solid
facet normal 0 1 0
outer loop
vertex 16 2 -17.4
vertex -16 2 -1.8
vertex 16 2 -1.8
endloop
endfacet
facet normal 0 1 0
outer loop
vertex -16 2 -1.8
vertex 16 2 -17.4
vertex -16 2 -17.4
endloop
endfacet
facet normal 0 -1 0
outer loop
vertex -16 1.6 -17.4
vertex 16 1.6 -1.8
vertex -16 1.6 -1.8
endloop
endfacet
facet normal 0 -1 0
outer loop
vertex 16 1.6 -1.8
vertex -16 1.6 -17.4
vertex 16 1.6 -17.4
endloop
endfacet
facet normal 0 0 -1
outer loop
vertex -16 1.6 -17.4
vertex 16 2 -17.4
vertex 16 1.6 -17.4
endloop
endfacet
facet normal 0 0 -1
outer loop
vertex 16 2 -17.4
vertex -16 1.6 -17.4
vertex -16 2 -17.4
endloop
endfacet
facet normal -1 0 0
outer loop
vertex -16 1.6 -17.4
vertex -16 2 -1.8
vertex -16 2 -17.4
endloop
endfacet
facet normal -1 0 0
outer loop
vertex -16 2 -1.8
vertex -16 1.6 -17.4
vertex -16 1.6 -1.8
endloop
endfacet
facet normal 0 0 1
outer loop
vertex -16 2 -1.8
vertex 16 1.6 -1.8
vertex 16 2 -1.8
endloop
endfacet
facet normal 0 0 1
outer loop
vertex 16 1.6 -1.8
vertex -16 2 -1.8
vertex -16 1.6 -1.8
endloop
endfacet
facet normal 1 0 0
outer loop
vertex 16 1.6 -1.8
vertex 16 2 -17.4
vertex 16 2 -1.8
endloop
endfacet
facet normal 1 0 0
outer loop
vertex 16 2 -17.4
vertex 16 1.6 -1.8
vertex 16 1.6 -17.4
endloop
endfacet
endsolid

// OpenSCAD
// file: ../p/box.scad
use <../lib.scad>
function ldraw_lib__box() = [
// 0 Box 6 (six faces)
// 0 Name: box.dat
// 0 Author: James Jessiman
// 0 !LDRAW_ORG Primitive UPDATE 2002-05
// 0 !LICENSE Licensed under CC BY 4.0 : see CAreadme.txt
// 
// 0 BFC CERTIFY CCW
  [0,"BFC","CERTIFY"],
  [0,"BFC","CCW"],
// 
// 0 !HISTORY 2002-08-22 [sbliss] Applied BFC
// 0 !HISTORY 2002-11-30 [PTadmin] Official Update 2002-05
// 0 !HISTORY 2007-06-24 [PTadmin] Header formatted for Contributor Agreement
// 0 !HISTORY 2008-07-01 [PTadmin] Official Update 2008-01
// 
// 
// 2 24 1 1 1 -1 1 1
  [2,24,1,1,1,-1,1,1],
// 2 24 -1 1 1 -1 1 -1
  [2,24,-1,1,1,-1,1,-1],
// 2 24 -1 1 -1 1 1 -1
  [2,24,-1,1,-1,1,1,-1],
// 2 24 1 1 -1 1 1 1
  [2,24,1,1,-1,1,1,1],
// 2 24 1 -1 1 -1 -1 1
  [2,24,1,-1,1,-1,-1,1],
// 2 24 -1 -1 1 -1 -1 -1
  [2,24,-1,-1,1,-1,-1,-1],
// 2 24 -1 -1 -1 1 -1 -1
  [2,24,-1,-1,-1,1,-1,-1],
// 2 24 1 -1 -1 1 -1 1
  [2,24,1,-1,-1,1,-1,1],
// 2 24 1 -1 1 1 1 1
  [2,24,1,-1,1,1,1,1],
// 2 24 -1 -1 1 -1 1 1
  [2,24,-1,-1,1,-1,1,1],
// 2 24 1 -1 -1 1 1 -1
  [2,24,1,-1,-1,1,1,-1],
// 2 24 -1 -1 -1 -1 1 -1
  [2,24,-1,-1,-1,-1,1,-1],
// 4 16 1 1 1 1 1 -1 -1 1 -1 -1 1 1
  [4,16,1,1,1,1,1,-1,-1,1,-1,-1,1,1],
// 4 16 -1 -1 -1 1 -1 -1 1 -1 1 -1 -1 1
  [4,16,-1,-1,-1,1,-1,-1,1,-1,1,-1,-1,1],
// 4 16 -1 -1 1 1 -1 1 1 1 1 -1 1 1
  [4,16,-1,-1,1,1,-1,1,1,1,1,-1,1,1],
// 4 16 -1 -1 -1 -1 -1 1 -1 1 1 -1 1 -1
  [4,16,-1,-1,-1,-1,-1,1,-1,1,1,-1,1,-1],
// 4 16 1 -1 -1 -1 -1 -1 -1 1 -1 1 1 -1
  [4,16,1,-1,-1,-1,-1,-1,-1,1,-1,1,1,-1],
// 4 16 1 -1 1 1 -1 -1 1 1 -1 1 1 1
  [4,16,1,-1,1,1,-1,-1,1,1,-1,1,1,1],
// 0
];
module ldraw_lib__box(step=0, col=false, unit=2/5, alt=false, line=0.2, solid=!$preview)
    makepoly(ldraw_lib__box(), step=step, col=col, unit=unit, alt=alt, line=line, solid=solid);
ldraw_lib__box(line=0.2);
// main file
use <../lib.scad>
use <../p/box.scad>
function ldraw_lib__u8034() = [
// 0 ~Mursten Glass for Window Pane  1 x  4 x  2
// 0 Name: u8034.dat
// 0 Author: J.C. Tchang [tchang]
// 0 !LDRAW_ORG Part UPDATE 2019-02
// 0 !LICENSE Licensed under CC BY 4.0 : see CAreadme.txt
// 
// 0 BFC CERTIFY CW
  [0,"BFC","CERTIFY"],
  [0,"BFC","CW"],
// 
// 0 !CATEGORY Window
// 0 !KEYWORDS Automatic Binding Brick
// 
// 0 !CMDLINE -c47
// 
// 0 !HISTORY 2019-09-09 [PTadmin] Official Update 2019-02
// 
// 
// 1 16 0 24 4.5 40 0 0 0 0 19.5 0 0.5 0 box.dat
  [1,16,0,24,4.5,40,0,0,0,0,19.5,0,0.5,0, ldraw_lib__box()],
];
module ldraw_lib__u8034(step=0, col=false, unit=2/5, alt=false, line=0.2, solid=!$preview)
    makepoly(ldraw_lib__u8034(), step=step, col=col, unit=unit, alt=alt, line=line, solid=solid);
ldraw_lib__u8034(line=0.2);
